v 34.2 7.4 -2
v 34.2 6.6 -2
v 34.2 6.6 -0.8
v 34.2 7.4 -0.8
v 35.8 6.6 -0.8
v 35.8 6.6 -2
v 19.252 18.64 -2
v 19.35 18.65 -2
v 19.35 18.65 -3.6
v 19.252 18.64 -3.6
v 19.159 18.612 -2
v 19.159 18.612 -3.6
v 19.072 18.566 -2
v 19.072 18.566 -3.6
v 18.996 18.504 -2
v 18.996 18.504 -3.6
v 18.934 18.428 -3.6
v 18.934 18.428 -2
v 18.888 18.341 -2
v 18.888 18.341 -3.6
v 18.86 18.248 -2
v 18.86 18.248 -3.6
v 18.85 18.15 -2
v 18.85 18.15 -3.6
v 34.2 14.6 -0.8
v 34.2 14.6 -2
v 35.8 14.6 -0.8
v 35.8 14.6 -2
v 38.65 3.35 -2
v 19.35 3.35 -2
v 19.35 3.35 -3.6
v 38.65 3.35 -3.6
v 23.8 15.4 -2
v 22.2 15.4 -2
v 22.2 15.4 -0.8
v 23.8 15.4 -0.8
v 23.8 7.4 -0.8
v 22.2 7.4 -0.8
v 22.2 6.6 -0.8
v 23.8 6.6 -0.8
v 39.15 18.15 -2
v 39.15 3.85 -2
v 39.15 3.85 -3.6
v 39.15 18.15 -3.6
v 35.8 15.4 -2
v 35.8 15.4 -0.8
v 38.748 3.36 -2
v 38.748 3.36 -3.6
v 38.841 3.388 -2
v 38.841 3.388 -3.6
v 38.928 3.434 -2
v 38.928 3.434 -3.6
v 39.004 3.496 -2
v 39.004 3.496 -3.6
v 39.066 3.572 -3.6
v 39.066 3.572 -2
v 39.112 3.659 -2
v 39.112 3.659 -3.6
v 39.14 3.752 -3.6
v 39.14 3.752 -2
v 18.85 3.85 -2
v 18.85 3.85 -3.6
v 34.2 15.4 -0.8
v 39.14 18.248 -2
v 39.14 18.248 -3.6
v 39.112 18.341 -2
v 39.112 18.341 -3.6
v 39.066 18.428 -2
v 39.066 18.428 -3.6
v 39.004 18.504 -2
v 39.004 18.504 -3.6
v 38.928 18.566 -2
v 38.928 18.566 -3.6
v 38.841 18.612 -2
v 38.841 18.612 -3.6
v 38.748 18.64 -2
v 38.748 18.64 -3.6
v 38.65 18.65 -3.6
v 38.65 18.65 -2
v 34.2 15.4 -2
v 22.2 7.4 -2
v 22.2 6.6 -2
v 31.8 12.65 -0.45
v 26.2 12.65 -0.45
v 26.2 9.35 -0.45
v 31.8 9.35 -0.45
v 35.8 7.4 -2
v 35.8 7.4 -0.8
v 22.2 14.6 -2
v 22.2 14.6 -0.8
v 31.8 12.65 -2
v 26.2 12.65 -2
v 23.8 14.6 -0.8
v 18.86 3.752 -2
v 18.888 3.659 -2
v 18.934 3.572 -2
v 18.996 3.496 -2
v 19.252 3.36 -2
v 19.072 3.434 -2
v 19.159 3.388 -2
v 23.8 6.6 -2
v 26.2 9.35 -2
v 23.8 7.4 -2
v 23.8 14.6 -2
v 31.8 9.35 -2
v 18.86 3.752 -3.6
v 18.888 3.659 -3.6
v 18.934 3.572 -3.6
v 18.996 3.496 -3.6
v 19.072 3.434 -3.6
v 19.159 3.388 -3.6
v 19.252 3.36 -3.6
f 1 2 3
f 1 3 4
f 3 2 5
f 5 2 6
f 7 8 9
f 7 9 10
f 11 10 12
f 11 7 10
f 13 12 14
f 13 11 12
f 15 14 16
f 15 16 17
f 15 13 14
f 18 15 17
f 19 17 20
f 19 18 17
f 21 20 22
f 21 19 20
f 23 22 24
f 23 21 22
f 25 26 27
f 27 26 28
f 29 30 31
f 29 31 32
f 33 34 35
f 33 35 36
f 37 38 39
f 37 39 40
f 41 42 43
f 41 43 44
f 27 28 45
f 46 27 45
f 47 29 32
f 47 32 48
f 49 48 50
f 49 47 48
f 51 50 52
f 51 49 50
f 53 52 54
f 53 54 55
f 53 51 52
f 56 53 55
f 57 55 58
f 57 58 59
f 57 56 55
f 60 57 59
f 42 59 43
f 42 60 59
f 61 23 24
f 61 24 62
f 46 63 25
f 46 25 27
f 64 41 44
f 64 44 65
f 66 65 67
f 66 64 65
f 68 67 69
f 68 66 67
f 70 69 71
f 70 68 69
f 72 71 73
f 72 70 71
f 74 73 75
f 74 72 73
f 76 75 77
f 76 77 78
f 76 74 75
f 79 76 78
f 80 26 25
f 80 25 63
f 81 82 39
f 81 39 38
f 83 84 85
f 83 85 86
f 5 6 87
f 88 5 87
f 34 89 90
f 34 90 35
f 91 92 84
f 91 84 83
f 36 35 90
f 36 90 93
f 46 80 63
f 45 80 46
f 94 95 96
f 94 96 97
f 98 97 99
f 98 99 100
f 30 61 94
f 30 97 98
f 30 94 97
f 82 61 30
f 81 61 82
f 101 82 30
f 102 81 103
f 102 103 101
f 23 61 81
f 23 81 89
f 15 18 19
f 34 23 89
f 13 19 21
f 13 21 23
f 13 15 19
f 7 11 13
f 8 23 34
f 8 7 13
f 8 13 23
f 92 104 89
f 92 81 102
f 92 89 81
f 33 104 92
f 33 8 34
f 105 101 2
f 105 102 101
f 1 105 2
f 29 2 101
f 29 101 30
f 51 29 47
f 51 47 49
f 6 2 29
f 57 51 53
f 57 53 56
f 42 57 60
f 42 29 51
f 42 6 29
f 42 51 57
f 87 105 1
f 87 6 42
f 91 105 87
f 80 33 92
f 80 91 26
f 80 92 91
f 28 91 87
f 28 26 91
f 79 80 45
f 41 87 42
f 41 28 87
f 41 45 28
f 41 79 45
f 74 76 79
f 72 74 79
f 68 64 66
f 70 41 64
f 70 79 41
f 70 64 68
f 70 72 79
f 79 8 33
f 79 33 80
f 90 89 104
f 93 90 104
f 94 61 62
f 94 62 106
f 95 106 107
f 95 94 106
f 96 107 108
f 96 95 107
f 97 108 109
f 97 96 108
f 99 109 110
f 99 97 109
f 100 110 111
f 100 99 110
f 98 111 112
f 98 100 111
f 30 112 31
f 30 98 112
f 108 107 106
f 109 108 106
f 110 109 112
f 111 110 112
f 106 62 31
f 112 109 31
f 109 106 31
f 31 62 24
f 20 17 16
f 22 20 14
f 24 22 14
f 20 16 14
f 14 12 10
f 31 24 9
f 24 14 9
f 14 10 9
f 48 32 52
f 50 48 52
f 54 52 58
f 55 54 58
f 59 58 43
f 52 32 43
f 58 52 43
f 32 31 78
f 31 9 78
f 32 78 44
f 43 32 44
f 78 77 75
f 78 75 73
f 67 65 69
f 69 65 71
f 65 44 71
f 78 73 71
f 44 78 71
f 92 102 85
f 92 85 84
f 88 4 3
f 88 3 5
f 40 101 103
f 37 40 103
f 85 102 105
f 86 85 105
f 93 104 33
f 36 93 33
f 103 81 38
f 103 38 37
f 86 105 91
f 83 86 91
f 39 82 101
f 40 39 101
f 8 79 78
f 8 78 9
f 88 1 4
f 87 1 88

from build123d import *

# Parameters (mm, degrees)
PCB_DEPTH   = 1.6
IC_SK2_W    = 5.6
IC_SK2_H    = 3.3
IC_DEPTH    = 1.55
PARTS_SK3_W = 1.6
PARTS_SK3_H = 0.8
PARTS_DEPTH = 1.2


with BuildPart() as part:
    # PCB_Sk1 → PCB (new body)
    with BuildSketch(Plane.XY.offset(-2)):
        with BuildLine():
            Line((19.35, 3.35), (38.65, 3.35))
            ThreePointArc((38.65, 3.35), (39.003553391, 3.496446609), (39.15, 3.85))
            Line((39.15, 3.85), (39.15, 18.15))
            ThreePointArc((39.15, 18.15), (39.003553391, 18.503553391), (38.65, 18.65))
            Line((38.65, 18.65), (19.35, 18.65))
            ThreePointArc((19.35, 18.65), (18.996446609, 18.503553391), (18.85, 18.15))
            Line((18.85, 18.15), (18.85, 3.85))
            ThreePointArc((18.85, 3.85), (18.996446609, 3.496446609), (19.35, 3.35))
        make_face()
    extrude(amount=-PCB_DEPTH)

    # IC_Sk2 → IC (add)
    with BuildSketch(Plane.XY.offset(-2)):
        with Locations((29, 11)):
            Rectangle(IC_SK2_W, IC_SK2_H)
    extrude(amount=IC_DEPTH)

    # Parts_Sk3 → Parts (add)
    with BuildSketch(Plane.XY.offset(-2)):
        with Locations((23, 7)):
            Rectangle(PARTS_SK3_W, PARTS_SK3_H)
        with Locations((23, 15)):
            Rectangle(PARTS_SK3_W, PARTS_SK3_H)
        with Locations((35, 7)):
            Rectangle(PARTS_SK3_W, PARTS_SK3_H)
        with Locations((35, 15)):
            Rectangle(PARTS_SK3_W, PARTS_SK3_H)
    extrude(amount=PARTS_DEPTH)


solid = part.part
